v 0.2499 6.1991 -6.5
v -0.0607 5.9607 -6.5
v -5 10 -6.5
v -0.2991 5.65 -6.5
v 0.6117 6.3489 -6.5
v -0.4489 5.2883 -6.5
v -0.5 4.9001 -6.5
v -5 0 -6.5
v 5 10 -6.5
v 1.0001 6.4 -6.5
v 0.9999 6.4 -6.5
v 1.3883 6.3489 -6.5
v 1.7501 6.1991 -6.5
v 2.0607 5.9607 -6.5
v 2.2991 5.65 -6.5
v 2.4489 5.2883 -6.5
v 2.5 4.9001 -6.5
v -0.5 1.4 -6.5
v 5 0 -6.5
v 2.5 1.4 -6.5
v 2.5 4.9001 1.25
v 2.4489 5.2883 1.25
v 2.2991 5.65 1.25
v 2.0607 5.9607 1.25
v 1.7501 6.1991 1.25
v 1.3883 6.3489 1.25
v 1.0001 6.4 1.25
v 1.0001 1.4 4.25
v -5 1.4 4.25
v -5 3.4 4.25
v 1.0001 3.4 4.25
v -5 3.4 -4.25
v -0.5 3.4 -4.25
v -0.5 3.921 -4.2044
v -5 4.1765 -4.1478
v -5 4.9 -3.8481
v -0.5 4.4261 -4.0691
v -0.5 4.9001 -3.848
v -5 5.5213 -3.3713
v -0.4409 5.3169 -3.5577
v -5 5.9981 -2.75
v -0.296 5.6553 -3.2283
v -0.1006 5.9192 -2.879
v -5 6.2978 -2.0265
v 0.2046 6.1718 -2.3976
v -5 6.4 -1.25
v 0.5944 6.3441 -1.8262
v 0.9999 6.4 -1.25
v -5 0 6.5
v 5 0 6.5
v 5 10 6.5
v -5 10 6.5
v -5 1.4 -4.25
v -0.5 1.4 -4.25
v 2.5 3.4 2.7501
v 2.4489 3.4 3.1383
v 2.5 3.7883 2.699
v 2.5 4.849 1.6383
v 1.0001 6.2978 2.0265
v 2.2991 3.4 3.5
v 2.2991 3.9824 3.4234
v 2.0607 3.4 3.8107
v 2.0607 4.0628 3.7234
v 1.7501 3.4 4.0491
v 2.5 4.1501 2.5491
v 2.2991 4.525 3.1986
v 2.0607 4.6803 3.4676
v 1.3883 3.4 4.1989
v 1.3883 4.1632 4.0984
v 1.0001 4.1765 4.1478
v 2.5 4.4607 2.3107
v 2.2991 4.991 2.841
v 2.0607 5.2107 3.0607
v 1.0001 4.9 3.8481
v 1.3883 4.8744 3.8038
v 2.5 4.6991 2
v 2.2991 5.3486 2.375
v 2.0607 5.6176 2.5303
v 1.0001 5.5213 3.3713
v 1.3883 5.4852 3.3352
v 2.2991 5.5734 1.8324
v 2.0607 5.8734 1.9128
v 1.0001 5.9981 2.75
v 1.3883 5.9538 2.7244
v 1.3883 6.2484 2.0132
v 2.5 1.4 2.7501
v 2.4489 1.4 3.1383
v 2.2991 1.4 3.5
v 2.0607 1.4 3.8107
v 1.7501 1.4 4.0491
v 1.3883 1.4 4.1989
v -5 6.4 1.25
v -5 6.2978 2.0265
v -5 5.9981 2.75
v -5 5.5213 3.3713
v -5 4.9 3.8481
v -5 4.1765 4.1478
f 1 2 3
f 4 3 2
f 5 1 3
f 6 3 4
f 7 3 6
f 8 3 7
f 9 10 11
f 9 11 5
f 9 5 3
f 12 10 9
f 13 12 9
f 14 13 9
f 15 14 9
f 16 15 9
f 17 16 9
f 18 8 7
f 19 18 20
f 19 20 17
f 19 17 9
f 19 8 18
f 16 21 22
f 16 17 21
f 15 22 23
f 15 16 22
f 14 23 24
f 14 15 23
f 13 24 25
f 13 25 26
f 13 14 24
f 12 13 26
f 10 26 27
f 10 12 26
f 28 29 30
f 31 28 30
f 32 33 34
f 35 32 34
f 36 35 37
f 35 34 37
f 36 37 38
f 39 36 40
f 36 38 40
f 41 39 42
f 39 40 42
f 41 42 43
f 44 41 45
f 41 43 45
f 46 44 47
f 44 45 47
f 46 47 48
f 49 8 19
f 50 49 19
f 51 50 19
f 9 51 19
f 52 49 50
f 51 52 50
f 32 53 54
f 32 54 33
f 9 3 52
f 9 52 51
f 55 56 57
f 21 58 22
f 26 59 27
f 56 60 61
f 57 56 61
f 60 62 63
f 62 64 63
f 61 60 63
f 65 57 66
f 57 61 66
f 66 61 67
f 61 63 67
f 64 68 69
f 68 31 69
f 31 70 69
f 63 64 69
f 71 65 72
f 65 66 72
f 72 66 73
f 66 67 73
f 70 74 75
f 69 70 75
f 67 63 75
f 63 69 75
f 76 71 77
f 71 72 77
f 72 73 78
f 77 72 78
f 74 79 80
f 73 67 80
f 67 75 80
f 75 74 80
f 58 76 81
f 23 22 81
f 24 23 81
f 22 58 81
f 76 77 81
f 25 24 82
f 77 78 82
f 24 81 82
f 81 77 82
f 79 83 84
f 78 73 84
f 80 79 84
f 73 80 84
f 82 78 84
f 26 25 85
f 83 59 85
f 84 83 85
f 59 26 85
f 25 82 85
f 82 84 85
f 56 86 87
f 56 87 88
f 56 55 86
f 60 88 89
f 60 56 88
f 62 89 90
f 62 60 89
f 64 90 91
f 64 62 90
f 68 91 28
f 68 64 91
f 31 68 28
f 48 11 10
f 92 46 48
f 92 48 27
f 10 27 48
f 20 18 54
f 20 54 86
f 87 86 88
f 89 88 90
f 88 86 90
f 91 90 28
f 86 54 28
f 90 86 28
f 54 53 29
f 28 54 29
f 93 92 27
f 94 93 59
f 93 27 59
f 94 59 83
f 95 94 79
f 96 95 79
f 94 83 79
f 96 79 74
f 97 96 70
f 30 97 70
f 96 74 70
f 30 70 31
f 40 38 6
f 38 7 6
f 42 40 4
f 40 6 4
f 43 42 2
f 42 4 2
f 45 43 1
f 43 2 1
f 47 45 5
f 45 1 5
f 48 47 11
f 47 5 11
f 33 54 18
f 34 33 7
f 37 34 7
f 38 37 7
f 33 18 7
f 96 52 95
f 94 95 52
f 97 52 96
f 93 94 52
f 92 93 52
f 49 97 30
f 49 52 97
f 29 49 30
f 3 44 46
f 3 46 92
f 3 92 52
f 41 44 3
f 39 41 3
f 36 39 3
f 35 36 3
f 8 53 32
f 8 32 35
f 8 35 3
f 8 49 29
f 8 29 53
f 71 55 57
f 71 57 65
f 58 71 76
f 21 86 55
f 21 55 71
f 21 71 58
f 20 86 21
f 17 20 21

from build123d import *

# Parameters (mm, degrees)
SKETCH1_W           = 10
SKETCH1_H           = 13
BOSS_EXTRUDE1_DEPTH = 10
SKETCH2_W           = 8.5
SKETCH2_H           = 5
CUT_EXTRUDE1_DEPTH  = 7.5
SKETCH3_W           = 3
SKETCH3_H           = 5
CUT_EXTRUDE3_DEPTH  = 10.75
FILLET3_R           = 3
FILLET5_R           = 1.5


with BuildPart() as part:
    # Sketch1 → Boss-Extrude1 (new body)
    with BuildSketch(Plane(origin=(0, 0, 0), x_dir=(1, 0, 0), z_dir=(0, 1, 0))):
        Rectangle(SKETCH1_W, SKETCH1_H)
    extrude(amount=BOSS_EXTRUDE1_DEPTH)

    # Sketch2 → Cut-Extrude1 (cut)
    with BuildSketch(Plane.ZY.offset(5)):
        with Locations((0, 3.9)):
            Rectangle(SKETCH2_W, SKETCH2_H)
    extrude(amount=-CUT_EXTRUDE1_DEPTH, mode=Mode.SUBTRACT)

    # Sketch3 → Cut-Extrude3 (cut)
    with BuildSketch(Plane(origin=(0, 0, -6.5), x_dir=(-1, 0, 0), z_dir=(0, 0, -1))):
        with Locations((-1, 3.9)):
            Rectangle(SKETCH3_W, SKETCH3_H)
    extrude(amount=-CUT_EXTRUDE3_DEPTH, mode=Mode.SUBTRACT)

    # Fillet3
    fillet3_edges = [part.edges().sort_by_distance(p)[0] for p in [
        (-1.25, 6.4, 4.25),
        (-2.75, 6.4, -4.25),
    ]]
    fillet(fillet3_edges, radius=FILLET3_R)

    # Fillet5
    fillet5_edges = [part.edges().sort_by_distance(p)[0] for p in [
        (2.5, 2.4, 4.25),
        (2.5, 5.521320344, 3.371320344),
        (2.5, 6.4, -2.625),
        (-0.5, 6.4, -3.875),
    ]]
    fillet(fillet5_edges, radius=FILLET5_R - 0.0001)  # a hair under: the kernel refuses the full size


solid = part.part
